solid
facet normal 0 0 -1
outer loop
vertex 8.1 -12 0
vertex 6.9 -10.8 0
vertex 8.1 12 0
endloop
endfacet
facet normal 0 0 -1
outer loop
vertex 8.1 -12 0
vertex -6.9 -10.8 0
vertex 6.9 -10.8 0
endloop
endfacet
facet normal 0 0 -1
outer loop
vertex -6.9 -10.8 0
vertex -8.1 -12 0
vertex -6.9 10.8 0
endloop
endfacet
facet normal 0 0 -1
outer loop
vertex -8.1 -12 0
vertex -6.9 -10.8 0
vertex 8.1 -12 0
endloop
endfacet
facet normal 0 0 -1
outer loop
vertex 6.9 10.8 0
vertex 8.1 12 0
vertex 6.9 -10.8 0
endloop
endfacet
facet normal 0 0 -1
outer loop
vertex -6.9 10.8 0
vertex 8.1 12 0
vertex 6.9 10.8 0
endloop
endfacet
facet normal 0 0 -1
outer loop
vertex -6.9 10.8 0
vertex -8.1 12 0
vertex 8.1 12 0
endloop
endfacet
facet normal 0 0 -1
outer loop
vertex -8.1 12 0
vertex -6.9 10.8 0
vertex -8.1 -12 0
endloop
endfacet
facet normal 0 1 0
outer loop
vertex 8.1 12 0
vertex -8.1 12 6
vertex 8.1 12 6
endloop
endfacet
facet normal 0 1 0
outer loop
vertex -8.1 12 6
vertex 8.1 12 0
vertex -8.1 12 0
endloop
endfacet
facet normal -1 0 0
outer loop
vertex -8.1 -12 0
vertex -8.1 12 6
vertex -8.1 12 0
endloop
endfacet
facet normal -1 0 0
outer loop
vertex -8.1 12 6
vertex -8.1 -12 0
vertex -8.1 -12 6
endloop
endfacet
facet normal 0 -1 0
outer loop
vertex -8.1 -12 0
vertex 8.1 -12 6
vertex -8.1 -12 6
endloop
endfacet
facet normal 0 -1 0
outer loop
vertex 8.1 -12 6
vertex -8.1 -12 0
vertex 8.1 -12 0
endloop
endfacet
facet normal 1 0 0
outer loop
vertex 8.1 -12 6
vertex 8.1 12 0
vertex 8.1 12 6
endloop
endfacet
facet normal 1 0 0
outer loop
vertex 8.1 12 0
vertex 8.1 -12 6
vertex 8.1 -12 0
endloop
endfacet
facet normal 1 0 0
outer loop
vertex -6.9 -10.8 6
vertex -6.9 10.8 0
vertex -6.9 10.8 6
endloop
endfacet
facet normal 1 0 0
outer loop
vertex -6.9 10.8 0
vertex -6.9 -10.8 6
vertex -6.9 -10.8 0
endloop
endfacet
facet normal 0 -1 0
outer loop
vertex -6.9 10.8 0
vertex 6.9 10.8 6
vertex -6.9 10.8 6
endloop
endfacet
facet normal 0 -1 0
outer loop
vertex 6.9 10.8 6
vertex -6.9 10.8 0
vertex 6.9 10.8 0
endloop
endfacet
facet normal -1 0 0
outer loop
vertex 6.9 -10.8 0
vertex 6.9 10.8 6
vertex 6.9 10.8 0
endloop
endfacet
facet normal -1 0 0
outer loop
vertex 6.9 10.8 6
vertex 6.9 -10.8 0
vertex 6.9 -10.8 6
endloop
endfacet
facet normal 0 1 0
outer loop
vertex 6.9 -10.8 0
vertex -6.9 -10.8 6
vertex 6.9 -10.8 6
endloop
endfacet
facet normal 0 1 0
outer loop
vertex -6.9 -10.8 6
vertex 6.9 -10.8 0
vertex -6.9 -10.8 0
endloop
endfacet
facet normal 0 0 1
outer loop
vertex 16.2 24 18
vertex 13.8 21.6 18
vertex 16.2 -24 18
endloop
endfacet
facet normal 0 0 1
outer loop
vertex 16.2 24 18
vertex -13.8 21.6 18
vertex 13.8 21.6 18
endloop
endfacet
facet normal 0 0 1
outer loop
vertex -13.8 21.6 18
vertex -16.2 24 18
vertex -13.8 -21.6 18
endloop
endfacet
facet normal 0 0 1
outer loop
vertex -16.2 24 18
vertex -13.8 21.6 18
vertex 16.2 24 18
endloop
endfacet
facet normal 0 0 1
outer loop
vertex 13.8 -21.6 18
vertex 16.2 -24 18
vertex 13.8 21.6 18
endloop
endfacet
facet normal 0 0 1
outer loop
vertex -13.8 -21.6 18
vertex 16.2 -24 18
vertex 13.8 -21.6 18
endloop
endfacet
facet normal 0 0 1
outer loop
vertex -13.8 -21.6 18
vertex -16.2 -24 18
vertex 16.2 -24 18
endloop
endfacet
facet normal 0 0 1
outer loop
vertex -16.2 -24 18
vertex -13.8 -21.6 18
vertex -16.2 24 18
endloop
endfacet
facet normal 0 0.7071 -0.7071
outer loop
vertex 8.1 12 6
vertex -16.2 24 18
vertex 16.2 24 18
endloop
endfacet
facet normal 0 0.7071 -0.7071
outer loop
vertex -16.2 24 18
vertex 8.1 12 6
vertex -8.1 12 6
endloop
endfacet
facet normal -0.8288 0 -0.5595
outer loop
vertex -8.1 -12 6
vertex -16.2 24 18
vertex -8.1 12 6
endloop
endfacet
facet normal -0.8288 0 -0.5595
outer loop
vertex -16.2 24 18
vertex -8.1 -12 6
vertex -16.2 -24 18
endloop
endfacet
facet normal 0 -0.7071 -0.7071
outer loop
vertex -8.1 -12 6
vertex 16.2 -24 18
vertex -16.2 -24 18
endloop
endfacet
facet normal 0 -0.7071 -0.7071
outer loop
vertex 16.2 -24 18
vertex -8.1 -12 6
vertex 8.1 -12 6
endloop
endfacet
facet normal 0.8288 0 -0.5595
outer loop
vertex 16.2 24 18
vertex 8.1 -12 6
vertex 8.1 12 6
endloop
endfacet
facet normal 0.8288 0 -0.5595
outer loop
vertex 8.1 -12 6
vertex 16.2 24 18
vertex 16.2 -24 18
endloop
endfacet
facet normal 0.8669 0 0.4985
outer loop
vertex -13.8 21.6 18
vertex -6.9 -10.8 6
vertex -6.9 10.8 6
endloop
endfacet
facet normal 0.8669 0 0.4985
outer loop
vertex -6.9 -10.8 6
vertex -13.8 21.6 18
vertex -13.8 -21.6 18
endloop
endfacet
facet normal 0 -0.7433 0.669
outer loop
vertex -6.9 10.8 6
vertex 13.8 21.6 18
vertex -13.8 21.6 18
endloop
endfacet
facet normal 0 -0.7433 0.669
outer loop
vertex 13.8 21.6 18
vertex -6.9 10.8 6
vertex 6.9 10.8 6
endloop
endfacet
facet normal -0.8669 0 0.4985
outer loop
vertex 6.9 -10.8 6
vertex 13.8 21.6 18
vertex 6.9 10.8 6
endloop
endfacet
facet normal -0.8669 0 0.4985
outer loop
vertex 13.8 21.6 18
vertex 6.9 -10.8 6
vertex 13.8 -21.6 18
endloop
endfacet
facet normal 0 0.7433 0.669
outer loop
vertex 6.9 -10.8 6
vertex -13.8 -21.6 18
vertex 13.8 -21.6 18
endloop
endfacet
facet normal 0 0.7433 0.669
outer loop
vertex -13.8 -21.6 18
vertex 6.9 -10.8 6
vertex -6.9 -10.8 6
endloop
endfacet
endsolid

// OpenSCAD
// Fritsch Container Funnel

minWallThck=1.2;
channelDims=[16.2,24,6];

squareFunnel();

module squareFunnel(){
  linear_extrude(channelDims.z) difference(){
    square([channelDims.x,channelDims.y],true);
    offset(-minWallThck) square([channelDims.x,channelDims.y],true);
  }
  translate([0,0,channelDims.z]) linear_extrude(channelDims.z*2,scale=[2,2]) difference(){
    square([channelDims.x,channelDims.y],true);
    offset(-minWallThck) square([channelDims.x,channelDims.y],true);
  }
}  
  
